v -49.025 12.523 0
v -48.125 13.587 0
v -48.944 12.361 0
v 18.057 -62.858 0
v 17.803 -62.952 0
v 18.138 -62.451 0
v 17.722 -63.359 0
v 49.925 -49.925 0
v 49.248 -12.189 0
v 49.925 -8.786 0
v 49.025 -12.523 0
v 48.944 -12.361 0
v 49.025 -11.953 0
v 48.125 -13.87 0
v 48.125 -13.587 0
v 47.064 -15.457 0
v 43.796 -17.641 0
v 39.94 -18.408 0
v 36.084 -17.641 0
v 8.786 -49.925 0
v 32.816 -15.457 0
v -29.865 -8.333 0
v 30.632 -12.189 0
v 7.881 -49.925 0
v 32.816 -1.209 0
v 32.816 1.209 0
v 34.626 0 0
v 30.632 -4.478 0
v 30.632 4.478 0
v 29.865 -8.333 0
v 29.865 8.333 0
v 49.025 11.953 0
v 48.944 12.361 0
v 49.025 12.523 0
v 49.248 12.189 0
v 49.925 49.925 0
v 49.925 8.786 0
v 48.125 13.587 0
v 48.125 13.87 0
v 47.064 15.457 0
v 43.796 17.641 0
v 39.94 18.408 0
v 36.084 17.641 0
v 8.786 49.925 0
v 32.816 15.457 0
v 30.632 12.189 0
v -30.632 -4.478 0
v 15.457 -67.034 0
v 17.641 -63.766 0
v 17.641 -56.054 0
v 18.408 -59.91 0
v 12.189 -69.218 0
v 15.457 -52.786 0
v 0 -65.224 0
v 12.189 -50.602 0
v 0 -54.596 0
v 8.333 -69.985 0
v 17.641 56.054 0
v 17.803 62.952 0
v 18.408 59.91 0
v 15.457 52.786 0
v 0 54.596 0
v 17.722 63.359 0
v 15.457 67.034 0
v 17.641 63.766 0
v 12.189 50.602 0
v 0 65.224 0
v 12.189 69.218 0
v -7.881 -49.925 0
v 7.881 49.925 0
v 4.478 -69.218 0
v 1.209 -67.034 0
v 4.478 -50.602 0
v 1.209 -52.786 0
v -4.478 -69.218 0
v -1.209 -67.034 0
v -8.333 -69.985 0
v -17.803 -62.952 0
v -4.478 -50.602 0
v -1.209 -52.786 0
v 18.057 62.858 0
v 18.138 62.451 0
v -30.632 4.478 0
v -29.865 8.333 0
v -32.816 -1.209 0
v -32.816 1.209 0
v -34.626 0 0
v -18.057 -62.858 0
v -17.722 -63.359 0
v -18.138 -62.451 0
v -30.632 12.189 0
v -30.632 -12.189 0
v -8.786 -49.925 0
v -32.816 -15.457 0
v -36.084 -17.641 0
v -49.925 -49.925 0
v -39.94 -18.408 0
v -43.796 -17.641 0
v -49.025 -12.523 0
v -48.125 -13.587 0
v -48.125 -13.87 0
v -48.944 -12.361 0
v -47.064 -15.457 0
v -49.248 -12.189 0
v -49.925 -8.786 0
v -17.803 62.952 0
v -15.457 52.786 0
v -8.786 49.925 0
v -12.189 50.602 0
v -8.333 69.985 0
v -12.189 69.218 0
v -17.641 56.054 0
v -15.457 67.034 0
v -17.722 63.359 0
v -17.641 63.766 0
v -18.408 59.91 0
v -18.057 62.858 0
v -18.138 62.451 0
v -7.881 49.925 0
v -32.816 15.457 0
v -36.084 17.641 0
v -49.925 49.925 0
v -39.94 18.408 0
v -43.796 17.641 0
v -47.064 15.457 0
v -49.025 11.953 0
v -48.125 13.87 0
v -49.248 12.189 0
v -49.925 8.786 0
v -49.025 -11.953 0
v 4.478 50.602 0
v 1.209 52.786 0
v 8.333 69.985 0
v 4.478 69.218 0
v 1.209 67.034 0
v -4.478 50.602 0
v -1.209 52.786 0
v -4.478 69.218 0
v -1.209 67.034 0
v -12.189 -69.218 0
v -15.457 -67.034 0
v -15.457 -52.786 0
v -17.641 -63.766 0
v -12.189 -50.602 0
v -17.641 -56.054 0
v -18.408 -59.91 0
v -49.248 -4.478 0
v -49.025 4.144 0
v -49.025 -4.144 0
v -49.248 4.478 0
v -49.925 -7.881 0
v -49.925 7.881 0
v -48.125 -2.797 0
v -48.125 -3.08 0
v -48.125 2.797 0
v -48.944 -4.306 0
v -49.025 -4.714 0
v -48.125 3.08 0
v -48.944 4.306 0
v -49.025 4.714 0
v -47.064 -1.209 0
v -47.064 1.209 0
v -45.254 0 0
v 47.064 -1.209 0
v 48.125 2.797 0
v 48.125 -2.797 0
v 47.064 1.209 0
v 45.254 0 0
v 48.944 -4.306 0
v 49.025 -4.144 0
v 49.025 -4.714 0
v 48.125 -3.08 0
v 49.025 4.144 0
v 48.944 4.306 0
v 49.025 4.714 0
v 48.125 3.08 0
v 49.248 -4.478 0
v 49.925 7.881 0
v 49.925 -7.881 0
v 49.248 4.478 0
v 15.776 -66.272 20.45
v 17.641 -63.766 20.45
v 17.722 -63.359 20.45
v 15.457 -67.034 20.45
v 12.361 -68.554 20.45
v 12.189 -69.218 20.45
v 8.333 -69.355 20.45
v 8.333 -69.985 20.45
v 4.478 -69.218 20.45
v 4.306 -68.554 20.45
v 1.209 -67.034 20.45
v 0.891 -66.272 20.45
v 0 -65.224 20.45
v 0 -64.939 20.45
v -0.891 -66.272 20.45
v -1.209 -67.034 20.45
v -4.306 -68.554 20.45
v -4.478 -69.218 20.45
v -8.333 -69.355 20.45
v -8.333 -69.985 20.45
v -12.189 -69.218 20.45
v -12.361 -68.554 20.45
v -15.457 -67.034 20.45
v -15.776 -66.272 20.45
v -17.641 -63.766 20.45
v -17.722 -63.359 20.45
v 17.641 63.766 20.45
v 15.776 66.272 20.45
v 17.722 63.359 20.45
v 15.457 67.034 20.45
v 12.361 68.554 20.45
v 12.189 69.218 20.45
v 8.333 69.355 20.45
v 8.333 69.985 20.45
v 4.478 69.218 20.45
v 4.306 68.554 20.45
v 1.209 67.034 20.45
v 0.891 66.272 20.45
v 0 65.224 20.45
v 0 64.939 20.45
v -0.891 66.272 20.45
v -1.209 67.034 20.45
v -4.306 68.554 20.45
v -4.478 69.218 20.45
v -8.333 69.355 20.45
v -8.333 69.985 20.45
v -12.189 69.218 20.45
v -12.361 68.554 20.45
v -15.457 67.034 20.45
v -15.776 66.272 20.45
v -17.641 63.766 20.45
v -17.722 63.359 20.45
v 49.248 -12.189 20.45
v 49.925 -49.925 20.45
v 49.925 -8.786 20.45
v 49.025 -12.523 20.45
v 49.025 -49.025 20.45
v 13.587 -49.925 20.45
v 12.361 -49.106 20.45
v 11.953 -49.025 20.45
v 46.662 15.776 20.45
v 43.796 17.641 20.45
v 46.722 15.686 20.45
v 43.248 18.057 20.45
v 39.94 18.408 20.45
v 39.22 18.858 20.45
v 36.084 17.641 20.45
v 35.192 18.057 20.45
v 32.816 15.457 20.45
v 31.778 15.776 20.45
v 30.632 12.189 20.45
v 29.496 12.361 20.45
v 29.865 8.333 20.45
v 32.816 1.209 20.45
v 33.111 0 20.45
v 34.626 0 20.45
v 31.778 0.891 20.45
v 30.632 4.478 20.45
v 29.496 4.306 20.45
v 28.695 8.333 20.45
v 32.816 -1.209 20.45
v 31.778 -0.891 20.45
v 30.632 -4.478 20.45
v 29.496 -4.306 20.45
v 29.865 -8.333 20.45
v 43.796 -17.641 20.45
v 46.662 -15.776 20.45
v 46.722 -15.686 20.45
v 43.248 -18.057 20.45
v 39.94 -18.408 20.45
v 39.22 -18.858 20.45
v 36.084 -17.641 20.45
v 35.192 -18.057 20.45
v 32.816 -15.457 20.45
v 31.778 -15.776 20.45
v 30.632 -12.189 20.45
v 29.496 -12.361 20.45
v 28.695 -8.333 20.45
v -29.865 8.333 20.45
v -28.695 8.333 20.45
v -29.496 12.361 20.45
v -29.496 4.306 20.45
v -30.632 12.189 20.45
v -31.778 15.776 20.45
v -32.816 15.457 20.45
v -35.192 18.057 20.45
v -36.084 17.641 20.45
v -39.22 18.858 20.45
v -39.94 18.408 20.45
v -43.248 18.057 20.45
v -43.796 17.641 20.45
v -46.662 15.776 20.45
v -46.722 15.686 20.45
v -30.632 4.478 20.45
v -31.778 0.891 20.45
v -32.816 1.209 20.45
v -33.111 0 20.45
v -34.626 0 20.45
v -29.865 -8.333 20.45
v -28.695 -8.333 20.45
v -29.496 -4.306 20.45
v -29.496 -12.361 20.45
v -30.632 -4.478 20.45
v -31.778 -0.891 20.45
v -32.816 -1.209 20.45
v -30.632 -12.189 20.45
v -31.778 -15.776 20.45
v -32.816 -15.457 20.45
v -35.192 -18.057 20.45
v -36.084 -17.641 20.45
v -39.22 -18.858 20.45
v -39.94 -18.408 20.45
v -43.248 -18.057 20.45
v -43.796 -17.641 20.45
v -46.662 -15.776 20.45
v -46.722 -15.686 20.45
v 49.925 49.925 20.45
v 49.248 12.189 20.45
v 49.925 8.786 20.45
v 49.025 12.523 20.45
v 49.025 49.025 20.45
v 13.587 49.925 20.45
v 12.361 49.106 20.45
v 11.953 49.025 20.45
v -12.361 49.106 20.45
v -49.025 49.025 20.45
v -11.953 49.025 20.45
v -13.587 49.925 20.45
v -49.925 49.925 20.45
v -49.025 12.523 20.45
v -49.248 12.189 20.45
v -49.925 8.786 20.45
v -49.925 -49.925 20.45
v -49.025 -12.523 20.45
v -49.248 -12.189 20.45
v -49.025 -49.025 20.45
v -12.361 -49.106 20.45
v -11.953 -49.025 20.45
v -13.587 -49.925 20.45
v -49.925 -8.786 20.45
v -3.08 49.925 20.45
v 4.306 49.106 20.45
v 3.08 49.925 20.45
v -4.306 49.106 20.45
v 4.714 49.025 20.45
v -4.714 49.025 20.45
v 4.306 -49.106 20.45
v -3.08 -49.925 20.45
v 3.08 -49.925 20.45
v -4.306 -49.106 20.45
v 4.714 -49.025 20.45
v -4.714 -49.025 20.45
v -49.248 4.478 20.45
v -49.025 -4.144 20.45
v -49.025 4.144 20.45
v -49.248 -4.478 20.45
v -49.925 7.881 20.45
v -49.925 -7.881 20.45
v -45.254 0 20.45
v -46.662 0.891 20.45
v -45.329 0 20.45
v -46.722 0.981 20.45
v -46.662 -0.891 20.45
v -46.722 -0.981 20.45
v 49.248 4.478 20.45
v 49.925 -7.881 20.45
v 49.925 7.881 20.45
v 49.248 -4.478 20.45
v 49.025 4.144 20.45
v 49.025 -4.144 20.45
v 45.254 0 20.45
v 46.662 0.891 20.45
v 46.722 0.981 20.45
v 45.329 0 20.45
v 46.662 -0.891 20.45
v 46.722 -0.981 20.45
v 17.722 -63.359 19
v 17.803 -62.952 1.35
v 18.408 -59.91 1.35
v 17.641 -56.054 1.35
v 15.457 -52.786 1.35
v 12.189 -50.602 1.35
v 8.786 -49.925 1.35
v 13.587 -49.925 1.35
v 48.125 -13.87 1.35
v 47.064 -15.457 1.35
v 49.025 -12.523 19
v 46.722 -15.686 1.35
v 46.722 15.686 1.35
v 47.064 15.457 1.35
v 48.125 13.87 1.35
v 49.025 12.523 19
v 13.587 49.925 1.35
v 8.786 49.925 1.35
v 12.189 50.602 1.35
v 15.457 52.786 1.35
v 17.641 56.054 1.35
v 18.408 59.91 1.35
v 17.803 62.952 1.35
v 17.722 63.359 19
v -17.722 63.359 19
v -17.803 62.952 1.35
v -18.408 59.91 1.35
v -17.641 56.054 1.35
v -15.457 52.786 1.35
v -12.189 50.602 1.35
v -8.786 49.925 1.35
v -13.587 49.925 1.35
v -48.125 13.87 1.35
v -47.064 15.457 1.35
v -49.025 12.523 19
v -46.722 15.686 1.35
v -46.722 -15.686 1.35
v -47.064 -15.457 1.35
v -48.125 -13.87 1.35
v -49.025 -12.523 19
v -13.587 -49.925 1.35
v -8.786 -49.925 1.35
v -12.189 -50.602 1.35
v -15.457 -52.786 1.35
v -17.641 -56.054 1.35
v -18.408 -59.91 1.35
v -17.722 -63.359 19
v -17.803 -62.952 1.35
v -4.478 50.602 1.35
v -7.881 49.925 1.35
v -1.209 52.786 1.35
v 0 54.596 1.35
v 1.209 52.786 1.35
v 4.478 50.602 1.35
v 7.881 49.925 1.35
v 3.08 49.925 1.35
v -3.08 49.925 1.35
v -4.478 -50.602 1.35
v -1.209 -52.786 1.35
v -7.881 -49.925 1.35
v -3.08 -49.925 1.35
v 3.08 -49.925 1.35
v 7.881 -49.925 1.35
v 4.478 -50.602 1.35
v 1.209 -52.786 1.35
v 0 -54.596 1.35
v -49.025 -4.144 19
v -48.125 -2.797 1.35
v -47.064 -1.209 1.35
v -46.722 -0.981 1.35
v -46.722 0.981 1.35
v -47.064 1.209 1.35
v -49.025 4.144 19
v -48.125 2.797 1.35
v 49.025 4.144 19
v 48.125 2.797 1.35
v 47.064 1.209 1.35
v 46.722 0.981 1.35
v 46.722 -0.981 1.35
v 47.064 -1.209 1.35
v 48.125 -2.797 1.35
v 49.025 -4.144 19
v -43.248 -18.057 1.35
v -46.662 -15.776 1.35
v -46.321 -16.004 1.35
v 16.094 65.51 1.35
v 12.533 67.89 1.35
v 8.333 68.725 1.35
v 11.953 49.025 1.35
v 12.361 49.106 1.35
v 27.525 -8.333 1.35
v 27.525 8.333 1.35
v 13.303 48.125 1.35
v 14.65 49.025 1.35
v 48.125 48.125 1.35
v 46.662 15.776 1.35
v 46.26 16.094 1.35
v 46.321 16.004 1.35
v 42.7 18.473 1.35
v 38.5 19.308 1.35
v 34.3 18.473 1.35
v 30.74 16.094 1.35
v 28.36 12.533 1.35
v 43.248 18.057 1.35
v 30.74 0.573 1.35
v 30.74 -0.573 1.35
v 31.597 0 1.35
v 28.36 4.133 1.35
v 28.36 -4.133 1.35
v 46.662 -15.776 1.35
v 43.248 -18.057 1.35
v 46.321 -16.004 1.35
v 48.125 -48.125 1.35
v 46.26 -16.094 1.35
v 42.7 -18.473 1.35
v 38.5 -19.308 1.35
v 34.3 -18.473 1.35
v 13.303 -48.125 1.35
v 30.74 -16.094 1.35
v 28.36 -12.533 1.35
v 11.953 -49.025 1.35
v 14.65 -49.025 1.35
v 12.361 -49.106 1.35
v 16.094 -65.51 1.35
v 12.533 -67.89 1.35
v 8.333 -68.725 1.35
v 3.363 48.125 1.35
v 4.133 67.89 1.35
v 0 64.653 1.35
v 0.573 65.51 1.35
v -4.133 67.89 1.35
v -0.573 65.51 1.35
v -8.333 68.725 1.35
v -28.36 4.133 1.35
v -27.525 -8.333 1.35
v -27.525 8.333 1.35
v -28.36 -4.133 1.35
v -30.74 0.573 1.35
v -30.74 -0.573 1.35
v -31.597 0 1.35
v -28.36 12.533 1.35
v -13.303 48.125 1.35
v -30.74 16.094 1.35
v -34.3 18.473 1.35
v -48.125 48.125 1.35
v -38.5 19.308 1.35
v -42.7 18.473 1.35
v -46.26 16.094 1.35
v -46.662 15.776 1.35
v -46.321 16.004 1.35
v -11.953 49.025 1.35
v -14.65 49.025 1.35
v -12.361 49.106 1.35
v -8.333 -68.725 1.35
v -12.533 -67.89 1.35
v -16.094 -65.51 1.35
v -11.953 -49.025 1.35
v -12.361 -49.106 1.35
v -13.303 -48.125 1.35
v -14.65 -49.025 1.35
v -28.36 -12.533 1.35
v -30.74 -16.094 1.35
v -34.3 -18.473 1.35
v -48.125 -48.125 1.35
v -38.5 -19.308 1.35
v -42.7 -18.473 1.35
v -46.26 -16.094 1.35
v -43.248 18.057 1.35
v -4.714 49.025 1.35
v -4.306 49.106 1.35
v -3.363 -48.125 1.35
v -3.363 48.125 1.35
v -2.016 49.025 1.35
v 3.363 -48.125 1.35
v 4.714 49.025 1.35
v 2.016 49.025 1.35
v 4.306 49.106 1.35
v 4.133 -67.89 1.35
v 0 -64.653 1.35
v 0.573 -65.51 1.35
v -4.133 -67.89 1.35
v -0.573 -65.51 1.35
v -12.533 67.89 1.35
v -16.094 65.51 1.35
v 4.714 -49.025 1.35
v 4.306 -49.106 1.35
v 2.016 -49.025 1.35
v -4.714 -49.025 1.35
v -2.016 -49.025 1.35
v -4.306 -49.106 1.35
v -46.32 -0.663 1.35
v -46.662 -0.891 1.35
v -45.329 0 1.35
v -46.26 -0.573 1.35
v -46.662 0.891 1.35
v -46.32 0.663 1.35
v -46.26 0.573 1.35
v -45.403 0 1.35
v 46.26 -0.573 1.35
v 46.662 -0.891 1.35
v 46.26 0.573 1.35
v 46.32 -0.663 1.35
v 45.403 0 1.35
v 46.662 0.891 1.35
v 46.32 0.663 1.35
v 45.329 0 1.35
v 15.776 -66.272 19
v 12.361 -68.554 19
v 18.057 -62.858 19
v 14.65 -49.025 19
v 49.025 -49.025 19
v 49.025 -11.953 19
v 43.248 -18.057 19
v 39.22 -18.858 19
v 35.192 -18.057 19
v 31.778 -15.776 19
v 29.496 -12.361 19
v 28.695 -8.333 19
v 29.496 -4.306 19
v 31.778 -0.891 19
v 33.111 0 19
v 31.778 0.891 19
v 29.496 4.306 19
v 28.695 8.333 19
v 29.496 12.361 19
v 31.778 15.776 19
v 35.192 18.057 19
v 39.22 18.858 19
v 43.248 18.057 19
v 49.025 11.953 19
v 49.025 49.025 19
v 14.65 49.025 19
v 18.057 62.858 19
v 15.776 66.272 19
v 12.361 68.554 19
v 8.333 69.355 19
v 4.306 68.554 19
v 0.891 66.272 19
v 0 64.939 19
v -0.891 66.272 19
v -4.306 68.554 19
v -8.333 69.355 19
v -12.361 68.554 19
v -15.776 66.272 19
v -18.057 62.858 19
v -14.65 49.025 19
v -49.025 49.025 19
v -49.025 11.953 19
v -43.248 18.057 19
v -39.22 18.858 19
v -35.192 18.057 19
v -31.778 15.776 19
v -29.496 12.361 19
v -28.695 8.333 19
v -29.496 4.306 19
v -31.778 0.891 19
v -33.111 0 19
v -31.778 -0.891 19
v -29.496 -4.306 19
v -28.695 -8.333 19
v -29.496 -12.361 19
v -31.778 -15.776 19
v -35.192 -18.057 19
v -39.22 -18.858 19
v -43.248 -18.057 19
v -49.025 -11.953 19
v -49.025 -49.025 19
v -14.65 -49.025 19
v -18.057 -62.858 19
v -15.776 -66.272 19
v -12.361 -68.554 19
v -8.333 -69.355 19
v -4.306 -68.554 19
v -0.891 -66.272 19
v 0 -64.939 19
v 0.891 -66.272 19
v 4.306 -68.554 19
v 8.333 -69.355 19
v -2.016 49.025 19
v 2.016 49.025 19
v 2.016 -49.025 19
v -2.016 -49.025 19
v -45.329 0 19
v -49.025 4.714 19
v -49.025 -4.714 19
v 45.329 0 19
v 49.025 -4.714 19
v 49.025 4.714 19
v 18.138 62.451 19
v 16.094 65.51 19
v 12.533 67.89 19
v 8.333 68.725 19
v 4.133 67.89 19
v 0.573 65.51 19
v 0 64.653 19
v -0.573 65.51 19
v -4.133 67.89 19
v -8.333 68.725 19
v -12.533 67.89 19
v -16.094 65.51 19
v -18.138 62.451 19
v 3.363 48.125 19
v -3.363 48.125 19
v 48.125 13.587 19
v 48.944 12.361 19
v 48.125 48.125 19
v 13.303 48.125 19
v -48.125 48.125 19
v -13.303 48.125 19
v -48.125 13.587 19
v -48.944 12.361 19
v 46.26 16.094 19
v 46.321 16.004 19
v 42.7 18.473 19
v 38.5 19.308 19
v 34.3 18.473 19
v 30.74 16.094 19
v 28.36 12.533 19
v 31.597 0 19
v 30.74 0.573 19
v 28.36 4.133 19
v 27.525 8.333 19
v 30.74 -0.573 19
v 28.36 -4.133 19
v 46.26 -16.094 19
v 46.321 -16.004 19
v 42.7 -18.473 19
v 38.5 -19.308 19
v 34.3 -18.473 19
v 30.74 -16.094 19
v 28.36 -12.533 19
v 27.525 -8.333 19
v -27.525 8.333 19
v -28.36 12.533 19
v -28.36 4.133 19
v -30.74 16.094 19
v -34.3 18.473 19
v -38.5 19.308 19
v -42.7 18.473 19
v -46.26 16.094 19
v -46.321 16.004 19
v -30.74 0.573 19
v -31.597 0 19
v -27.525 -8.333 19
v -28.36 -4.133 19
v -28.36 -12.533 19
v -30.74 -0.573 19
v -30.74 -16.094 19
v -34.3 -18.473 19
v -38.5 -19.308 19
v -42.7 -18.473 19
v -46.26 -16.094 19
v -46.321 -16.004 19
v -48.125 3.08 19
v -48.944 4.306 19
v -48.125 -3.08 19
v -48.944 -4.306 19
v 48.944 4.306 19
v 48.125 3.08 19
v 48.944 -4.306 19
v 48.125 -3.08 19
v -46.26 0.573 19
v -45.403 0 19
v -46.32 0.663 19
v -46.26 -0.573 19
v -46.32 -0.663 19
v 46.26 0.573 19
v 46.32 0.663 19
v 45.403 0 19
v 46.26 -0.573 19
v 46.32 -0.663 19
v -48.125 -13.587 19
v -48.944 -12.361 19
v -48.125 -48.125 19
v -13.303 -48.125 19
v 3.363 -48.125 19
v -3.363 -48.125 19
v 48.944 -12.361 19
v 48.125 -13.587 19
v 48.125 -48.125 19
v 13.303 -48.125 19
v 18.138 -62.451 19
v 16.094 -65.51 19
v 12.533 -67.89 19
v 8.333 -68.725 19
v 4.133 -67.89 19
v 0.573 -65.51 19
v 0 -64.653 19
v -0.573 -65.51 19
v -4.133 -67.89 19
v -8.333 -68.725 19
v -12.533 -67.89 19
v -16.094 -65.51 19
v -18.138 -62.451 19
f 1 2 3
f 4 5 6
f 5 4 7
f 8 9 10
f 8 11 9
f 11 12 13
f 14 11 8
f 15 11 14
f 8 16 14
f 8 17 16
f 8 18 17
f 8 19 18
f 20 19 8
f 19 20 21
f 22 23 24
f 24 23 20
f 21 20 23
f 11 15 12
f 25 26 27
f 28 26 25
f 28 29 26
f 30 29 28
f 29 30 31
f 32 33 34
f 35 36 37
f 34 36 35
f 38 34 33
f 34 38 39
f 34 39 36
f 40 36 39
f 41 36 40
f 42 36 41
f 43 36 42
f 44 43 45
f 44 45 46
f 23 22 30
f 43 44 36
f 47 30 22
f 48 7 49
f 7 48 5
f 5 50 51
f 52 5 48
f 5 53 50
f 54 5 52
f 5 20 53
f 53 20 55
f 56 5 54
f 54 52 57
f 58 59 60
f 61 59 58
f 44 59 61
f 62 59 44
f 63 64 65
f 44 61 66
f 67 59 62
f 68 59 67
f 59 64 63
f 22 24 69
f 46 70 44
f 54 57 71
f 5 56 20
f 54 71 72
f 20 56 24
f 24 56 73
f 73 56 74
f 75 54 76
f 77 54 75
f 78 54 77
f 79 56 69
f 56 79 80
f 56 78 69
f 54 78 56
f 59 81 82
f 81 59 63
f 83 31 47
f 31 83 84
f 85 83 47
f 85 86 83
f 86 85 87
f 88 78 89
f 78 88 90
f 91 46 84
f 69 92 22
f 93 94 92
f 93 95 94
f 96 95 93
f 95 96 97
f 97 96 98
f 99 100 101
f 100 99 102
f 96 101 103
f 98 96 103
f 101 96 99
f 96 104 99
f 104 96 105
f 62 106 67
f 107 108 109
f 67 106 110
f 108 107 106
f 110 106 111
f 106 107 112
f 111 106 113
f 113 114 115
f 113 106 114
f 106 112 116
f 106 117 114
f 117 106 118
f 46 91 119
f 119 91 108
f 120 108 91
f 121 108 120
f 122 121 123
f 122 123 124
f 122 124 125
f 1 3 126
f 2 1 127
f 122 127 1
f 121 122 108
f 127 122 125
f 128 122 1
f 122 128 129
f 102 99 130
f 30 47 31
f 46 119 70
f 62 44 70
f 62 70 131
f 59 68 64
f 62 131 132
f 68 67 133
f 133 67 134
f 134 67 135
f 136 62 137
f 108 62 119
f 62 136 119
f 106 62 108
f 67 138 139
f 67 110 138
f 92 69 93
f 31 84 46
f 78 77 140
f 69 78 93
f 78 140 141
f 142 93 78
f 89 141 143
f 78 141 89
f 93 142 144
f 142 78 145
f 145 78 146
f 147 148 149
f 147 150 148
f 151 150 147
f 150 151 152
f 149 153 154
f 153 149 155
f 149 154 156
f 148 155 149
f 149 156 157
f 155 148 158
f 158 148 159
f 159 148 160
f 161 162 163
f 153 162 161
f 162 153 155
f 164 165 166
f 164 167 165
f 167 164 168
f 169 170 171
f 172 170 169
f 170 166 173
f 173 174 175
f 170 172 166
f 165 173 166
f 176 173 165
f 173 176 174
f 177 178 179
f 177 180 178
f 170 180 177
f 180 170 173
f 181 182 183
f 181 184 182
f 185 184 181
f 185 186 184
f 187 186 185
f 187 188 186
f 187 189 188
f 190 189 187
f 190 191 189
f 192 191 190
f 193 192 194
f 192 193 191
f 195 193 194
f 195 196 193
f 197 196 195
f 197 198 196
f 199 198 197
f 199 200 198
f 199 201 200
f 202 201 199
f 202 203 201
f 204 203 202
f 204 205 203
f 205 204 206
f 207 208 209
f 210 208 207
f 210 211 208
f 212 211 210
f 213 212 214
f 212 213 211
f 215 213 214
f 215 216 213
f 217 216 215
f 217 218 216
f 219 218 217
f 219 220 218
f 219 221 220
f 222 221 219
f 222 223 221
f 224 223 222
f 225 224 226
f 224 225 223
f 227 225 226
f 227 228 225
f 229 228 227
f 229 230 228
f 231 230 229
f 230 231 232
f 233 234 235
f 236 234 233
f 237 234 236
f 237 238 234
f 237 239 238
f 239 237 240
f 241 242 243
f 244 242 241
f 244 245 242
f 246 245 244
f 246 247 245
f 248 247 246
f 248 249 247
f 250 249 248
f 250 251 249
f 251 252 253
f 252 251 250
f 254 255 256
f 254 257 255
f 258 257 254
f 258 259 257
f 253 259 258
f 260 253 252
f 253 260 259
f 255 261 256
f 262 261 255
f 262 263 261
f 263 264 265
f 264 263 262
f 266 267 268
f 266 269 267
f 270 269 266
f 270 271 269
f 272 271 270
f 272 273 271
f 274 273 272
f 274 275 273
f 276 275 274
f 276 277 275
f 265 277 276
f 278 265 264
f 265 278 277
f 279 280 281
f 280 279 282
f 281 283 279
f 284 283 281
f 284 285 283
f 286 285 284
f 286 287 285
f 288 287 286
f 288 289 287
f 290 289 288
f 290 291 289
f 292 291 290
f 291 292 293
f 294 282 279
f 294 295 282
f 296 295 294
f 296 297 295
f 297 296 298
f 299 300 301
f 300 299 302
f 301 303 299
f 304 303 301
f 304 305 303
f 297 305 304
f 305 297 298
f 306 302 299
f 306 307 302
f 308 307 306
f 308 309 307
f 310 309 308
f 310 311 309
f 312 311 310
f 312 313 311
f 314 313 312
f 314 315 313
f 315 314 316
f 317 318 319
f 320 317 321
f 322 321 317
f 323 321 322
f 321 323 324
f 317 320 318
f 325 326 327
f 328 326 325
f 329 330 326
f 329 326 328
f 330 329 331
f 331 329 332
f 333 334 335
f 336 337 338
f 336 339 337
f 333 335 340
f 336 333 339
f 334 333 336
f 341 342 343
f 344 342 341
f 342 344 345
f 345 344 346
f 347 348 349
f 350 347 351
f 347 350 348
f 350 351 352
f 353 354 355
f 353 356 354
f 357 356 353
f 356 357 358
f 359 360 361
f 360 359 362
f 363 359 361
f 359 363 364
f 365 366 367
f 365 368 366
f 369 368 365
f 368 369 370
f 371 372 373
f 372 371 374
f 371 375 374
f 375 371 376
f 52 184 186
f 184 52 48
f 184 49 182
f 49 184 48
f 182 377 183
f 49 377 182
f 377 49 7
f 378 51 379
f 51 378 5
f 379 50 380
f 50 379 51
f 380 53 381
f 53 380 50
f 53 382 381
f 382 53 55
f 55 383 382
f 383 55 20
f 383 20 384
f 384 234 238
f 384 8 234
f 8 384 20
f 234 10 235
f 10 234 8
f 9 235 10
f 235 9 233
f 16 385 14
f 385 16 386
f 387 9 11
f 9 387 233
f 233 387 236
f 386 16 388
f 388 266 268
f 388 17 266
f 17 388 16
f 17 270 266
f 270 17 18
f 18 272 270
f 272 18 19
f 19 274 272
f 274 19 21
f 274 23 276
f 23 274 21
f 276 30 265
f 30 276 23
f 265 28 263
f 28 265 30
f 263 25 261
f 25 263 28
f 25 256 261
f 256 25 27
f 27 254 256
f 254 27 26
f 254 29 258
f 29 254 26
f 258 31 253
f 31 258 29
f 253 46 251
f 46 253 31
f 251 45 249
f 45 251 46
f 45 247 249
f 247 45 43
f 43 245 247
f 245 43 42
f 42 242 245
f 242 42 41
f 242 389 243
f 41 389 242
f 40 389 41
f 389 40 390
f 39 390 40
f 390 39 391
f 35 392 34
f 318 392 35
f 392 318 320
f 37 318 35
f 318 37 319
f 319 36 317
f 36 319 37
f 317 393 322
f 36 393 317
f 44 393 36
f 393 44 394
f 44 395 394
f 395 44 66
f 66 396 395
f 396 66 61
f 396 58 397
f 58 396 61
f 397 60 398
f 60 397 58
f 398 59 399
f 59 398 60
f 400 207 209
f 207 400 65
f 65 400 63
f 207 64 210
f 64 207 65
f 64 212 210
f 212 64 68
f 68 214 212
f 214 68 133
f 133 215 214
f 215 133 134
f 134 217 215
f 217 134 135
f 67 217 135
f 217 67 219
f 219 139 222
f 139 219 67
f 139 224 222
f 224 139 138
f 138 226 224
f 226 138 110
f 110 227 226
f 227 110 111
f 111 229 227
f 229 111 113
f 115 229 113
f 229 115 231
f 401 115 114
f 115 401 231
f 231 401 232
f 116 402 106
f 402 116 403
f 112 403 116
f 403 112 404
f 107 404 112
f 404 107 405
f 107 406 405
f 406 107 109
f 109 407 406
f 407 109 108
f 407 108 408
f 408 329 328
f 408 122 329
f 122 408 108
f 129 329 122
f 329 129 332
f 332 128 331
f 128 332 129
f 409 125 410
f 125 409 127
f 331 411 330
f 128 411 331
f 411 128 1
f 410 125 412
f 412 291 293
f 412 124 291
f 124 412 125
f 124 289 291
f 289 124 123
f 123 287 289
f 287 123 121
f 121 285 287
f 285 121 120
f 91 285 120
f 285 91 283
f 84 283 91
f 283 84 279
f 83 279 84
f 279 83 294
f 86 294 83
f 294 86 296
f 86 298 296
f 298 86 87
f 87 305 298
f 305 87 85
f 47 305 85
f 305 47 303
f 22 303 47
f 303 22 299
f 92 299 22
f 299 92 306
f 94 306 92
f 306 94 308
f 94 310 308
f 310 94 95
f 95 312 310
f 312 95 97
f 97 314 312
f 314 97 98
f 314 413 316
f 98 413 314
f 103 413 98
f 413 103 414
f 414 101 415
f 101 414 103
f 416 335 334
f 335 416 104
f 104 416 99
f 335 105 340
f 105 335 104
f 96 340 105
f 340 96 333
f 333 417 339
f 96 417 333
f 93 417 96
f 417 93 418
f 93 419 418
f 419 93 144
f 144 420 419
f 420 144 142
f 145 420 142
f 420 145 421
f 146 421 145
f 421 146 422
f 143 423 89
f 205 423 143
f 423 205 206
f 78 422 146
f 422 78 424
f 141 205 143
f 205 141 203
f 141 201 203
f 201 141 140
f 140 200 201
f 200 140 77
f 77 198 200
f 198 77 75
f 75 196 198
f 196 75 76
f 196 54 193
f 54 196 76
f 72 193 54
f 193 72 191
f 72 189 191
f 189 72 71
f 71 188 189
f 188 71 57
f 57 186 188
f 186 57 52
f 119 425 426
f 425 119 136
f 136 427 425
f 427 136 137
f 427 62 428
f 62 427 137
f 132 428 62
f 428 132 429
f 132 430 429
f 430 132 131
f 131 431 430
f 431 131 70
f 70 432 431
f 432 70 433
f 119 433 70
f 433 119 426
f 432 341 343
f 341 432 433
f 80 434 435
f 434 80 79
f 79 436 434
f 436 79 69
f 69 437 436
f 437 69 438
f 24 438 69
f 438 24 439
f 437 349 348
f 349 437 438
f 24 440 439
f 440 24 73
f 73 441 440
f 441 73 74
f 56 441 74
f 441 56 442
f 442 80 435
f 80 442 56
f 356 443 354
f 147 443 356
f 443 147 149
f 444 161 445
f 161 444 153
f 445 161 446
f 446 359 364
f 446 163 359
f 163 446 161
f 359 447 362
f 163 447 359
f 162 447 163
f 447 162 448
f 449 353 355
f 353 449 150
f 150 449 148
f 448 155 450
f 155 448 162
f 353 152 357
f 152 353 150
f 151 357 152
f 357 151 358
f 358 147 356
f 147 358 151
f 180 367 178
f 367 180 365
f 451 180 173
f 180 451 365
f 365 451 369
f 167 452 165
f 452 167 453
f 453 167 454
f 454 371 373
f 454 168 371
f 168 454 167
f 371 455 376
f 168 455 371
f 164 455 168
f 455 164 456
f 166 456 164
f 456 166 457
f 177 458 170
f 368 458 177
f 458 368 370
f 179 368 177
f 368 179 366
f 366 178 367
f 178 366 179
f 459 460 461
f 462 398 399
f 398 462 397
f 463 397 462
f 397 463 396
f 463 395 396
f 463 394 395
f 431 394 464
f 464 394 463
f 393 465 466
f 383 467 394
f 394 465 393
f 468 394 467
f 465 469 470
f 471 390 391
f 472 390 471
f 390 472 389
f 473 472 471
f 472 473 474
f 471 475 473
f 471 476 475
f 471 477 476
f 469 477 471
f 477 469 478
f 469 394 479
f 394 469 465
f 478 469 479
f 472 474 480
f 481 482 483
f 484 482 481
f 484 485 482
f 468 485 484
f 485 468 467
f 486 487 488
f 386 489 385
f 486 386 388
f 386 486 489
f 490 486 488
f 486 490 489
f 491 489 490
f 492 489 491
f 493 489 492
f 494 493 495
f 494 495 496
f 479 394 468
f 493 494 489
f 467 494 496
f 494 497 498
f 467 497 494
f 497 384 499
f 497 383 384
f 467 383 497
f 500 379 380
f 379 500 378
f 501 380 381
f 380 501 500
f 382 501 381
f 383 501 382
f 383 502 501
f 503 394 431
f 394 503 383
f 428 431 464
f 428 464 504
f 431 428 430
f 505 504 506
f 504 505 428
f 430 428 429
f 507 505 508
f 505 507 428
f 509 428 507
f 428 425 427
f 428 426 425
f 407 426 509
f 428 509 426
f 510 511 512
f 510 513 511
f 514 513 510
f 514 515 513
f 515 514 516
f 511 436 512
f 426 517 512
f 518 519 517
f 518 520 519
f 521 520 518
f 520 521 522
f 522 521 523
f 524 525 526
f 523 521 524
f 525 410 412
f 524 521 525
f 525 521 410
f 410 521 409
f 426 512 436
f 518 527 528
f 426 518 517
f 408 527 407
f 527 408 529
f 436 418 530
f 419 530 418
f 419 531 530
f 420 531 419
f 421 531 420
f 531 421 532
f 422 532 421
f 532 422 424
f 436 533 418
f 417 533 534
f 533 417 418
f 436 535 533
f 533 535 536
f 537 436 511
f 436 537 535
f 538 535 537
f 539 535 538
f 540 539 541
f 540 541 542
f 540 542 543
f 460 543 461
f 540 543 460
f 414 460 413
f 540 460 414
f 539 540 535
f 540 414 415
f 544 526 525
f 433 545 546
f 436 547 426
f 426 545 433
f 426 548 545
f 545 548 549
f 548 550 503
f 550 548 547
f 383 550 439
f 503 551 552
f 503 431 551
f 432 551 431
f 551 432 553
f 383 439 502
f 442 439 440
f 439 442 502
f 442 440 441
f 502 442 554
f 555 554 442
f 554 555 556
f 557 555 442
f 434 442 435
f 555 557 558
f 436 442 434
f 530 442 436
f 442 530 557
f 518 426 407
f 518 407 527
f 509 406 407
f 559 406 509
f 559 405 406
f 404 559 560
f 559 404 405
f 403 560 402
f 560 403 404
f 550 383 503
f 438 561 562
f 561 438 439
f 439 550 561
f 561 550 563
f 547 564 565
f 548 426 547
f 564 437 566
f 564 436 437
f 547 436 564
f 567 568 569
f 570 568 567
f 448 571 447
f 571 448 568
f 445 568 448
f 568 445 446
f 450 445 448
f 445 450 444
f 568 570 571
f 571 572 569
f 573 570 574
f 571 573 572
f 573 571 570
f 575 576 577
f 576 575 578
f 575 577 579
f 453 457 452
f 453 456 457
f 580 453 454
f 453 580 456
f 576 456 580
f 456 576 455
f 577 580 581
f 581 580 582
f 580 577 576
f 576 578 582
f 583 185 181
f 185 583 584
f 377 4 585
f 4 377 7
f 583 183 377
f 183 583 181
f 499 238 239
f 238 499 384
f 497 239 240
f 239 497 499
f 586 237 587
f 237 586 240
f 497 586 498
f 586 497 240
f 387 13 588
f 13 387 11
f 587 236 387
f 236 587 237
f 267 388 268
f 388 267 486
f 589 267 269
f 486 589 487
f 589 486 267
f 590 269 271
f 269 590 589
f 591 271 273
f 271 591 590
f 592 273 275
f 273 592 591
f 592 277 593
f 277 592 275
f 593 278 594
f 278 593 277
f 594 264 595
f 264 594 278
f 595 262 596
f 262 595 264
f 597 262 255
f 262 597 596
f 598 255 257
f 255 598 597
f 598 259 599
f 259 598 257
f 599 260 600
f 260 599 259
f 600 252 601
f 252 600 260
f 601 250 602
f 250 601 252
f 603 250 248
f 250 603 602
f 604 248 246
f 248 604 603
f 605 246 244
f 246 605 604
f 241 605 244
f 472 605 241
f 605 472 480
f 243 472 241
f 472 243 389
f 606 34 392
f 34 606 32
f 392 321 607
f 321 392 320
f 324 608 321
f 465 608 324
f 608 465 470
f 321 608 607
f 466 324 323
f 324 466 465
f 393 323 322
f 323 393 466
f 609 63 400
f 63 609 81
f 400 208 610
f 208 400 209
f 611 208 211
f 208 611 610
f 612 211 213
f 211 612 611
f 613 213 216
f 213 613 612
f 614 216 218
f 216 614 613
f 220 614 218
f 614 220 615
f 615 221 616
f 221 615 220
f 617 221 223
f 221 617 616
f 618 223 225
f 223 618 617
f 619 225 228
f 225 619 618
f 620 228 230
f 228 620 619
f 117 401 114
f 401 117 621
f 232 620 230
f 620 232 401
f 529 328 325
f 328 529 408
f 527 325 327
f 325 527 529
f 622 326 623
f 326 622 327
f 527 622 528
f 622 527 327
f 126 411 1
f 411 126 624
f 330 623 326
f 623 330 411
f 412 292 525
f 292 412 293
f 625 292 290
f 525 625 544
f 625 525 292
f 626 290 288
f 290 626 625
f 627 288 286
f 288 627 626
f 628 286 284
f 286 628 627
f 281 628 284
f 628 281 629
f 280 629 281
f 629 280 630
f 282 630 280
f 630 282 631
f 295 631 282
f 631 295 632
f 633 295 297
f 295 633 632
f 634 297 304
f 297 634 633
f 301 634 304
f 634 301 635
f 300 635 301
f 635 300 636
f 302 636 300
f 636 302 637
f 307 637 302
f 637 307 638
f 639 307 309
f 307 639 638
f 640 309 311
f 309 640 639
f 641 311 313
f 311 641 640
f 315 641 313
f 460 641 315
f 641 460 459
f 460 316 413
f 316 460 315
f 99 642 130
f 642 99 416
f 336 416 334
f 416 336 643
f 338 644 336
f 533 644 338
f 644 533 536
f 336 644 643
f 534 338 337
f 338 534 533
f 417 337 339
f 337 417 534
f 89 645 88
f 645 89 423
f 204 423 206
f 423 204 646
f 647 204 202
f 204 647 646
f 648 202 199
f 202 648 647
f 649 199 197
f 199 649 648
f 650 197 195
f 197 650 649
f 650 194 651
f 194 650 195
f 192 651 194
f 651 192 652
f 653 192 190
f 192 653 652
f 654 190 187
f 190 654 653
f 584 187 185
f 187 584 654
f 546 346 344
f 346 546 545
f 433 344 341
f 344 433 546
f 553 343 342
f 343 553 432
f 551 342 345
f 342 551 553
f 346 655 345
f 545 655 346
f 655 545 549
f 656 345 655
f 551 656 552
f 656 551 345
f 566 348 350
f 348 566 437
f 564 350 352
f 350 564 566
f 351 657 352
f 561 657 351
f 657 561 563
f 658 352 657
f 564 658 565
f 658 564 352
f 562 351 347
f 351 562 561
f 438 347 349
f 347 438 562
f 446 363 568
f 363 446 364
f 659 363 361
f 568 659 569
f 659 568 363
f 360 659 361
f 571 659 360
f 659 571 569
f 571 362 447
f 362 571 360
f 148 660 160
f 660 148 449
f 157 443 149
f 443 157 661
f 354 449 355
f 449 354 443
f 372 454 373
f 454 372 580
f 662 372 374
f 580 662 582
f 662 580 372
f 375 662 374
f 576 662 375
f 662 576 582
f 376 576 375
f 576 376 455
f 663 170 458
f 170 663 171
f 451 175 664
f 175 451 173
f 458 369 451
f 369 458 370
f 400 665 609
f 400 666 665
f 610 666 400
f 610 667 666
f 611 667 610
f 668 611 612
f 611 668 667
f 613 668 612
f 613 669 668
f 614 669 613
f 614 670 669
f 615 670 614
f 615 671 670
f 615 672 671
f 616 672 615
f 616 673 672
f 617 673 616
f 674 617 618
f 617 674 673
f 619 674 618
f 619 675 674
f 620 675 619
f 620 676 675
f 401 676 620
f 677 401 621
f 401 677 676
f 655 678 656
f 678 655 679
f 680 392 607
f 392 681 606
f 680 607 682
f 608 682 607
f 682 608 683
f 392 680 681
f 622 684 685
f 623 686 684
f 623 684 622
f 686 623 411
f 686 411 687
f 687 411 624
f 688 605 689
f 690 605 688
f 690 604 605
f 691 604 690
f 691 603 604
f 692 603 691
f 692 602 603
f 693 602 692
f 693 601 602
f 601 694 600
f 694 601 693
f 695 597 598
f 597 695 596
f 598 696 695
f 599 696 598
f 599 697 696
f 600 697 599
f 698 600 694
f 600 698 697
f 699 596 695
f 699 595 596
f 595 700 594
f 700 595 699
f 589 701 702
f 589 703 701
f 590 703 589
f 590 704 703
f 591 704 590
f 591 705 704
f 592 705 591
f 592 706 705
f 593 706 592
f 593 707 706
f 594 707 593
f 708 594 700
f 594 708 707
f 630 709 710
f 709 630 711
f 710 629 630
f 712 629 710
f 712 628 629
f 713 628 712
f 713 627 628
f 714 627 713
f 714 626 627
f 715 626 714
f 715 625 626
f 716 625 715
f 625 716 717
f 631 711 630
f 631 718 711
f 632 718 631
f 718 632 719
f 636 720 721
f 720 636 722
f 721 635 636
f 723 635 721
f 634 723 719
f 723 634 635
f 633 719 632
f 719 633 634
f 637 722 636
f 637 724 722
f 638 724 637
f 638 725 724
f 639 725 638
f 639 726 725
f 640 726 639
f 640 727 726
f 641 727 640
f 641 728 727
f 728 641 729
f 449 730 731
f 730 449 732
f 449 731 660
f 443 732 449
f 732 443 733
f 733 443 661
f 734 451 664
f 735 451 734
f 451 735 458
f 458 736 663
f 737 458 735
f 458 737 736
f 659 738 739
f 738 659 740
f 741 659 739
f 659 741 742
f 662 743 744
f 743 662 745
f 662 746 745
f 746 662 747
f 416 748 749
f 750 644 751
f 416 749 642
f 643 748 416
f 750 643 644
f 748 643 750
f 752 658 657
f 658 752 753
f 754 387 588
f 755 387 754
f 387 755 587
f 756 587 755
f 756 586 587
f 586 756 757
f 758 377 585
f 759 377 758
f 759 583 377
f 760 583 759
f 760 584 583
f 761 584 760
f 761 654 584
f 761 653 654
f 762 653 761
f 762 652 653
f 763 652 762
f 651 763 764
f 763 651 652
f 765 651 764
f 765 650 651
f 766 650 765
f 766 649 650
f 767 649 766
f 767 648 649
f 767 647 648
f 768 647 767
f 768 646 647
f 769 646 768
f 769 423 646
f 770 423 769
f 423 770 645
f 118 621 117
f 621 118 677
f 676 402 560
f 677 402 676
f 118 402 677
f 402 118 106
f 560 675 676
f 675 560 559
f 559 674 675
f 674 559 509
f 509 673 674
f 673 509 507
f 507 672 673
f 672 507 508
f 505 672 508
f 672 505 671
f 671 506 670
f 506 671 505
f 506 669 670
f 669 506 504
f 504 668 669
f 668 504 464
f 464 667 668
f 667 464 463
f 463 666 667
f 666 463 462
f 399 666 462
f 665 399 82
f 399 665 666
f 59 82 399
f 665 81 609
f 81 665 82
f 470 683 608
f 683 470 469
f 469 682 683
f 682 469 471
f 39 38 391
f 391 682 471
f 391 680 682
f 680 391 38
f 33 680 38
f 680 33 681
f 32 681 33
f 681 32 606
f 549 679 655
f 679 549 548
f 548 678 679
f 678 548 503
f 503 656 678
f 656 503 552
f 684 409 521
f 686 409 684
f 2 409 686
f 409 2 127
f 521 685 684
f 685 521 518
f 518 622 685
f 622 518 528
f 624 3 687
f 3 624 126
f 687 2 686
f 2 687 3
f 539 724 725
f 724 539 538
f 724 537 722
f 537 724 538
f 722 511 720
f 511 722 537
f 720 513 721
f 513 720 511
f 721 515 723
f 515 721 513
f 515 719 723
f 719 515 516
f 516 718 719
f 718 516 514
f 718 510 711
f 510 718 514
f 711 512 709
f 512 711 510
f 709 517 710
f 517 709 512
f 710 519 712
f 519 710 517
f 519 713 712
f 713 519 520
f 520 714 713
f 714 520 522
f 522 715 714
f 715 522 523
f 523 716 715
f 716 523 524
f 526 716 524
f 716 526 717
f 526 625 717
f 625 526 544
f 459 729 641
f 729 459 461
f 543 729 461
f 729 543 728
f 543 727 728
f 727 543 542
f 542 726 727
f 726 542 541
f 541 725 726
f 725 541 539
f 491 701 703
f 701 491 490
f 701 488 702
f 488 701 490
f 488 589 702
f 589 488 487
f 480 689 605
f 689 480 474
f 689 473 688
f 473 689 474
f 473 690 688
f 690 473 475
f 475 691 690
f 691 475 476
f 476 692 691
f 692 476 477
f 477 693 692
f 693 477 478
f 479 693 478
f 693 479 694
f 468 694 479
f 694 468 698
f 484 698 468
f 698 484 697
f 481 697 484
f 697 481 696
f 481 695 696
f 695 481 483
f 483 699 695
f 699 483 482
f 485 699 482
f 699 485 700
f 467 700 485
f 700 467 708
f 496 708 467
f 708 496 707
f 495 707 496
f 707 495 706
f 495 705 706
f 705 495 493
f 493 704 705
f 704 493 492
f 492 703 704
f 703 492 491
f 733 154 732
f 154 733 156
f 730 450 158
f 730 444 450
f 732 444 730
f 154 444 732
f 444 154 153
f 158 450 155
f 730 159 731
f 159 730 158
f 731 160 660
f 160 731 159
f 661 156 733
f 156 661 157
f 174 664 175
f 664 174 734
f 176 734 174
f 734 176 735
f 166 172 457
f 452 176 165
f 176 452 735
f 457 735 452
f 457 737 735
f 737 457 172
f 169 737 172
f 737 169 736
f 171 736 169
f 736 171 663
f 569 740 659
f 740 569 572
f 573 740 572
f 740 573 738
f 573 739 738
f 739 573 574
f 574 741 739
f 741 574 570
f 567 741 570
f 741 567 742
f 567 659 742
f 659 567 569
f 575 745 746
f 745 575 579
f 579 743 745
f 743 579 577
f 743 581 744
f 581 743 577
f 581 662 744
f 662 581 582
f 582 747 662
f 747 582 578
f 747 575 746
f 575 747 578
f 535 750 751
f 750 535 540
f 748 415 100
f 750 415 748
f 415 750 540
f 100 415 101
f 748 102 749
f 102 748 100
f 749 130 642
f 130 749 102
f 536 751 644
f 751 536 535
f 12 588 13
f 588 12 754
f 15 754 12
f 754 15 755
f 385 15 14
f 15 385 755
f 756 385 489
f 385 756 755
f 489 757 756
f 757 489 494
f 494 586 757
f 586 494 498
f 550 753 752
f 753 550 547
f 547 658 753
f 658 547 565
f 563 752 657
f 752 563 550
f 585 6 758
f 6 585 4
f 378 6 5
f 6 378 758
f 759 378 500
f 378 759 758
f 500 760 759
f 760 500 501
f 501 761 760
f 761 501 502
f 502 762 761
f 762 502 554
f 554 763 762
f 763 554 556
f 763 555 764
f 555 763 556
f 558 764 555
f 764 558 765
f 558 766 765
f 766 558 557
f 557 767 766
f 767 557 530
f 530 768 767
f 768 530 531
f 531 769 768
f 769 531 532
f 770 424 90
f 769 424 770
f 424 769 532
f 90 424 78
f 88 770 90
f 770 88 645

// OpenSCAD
height = 20; //mm
sizeX = 50; //mm Size of piece on x axis
sizeY = 50; //mm Size on y axis

piece_size = 50;//mm Size of the main square [sizeX,sizeY]; //mm,mm Size of puzzle box
joint_radius = 10; //mm Radius of joints

joint_numerator = 6;
joint_denomenator = 10;

joint_diffnumerator = joint_denomenator-joint_numerator;

outward = (joint_numerator/joint_denomenator);
inward = (joint_diffnumerator/joint_denomenator);
thickness=.45; // Do not set this below your default extrusion width or you WILL get bad underextrusion on the straight parts! If they even show up once sliced. Also if you have the walls too thick you will need to have support on the top part. Or might need them anyways. TIP: when printing in clear set it to exactly your extrusion width for best clarity.
lid_thickness=1; //mm Thickness of the lid
lip_thickness=.45; //mm Thickness of the lip near the top of the puzzlebox bottom
text_thickness=1.2; //mm Thickness of the text
tolerance=0.075; //mm Extra gap between parts
top = false;

xmult=2;
ymult=2;

top_text = "PuzzleBox"; // Text to add to the top of the box.
top_textsize = 7; // size param for text
top_font = "Linux Libertine Mono O:stype=Bold"; // Font for the text
text_spacing = .75; // Spacing of text

text_direction="ttb"; // Direction of text

text_rotation=0; //° Rotation of text
text_resolution=80; // Resolution of text, the $fn of the function.
text_posx=0;
text_posy=0; // NOTE: font appears to be offset by -1, adjusted in code.

module inner_joint(size,radius,ext,shift=0,ratio=inward) {
	echo("x",ext);
	translate([size*ratio,shift]) circle(radius+ext,$fn=16);
	translate([-size*ratio,shift]) circle(radius+ext,$fn=16);
}
module outer_joint(size,radius,ext,shift=0,ratio=outward) {
	echo("y",ext);
	translate([shift,size*ratio]) circle(radius+ext,$fn=16);
	translate([shift,-size*ratio]) circle(radius+ext,$fn=16);
}
/*module puzzlepiece2(size,radius,size_ext=0,mx=1,my=1) {
	ext=size_ext+tolerance;
	union() {
		union() {
			square(size-(ext*2),center=true);
			for (i == [1:mx]) {
			shift=(i*(size/(mx+1)))-(size/2);
			inner_joint(size,radius,shift);
			}
		}
		for (i == [1,my]) {
			shift=(i*(size/(my+1)))-(size/2);
			outer_joint(size,radius,shift);
		}
	}
}
*/
module puzzlepiece(size,radius,size_ext=0,mx=1,my=1) {
	function ext(m)=(size_ext*m)+tolerance;
	xsize=(size*mx)-(ext(mx)*2);
	ysize=(size*my)-(ext(my)*2);
	echo(my,ysize);
	color([0.5,0,1]) union() {
		color(1,0,0.5) difference() {
			square([xsize,ysize],center=true);
			for (i = [1:mx]) {
				shift=(i*(size/(mx+1)))-(size/2
				);
				inner_joint(xsize,radius,ext,shift,inward*mx/2);
			}
		}
		ext=size_ext+tolerance; // No clue why but it has to be redefined here.
		for (i = [1:my]) {
			shift=(i*(size/(my+1)))-(size/2);
			outer_joint(ysize,radius,ext,shift,outward*my/2);
		}
	}
}
if (top == false) {
//echo(inward,outward);
difference() {
	linear_extrude(height+thickness) puzzlepiece(piece_size,joint_radius,mx=xmult,my=ymult);
	translate([0,0,thickness*3]) 	linear_extrude(height+(thickness*2)) puzzlepiece(piece_size,joint_radius,thickness,mx=xmult,my=ymult);
}
linear_extrude(height-lid_thickness) difference() {
			puzzlepiece(piece_size,joint_radius,thickness,mx=xmult,my=ymult);
			puzzlepiece(piece_size,joint_radius,thickness+lip_thickness,mx=xmult,my=ymult);
}
} else {
	linear_extrude(lid_thickness) puzzlepiece(piece_size,joint_radius,thickness,mx=xmult,my=ymult);
	//translate([0,0,lid_thickness]) linear_extrude(thickness) puzzlepiece(piece_size,joint_radius);
	translate([text_posx,text_posy-1,lid_thickness]) rotate([0,0,text_rotation]) linear_extrude(text_thickness) text(text=top_text,size=top_textsize,font=top_font,halign="center",valign="center",spacing=text_spacing,direction=text_direction);
}
	
